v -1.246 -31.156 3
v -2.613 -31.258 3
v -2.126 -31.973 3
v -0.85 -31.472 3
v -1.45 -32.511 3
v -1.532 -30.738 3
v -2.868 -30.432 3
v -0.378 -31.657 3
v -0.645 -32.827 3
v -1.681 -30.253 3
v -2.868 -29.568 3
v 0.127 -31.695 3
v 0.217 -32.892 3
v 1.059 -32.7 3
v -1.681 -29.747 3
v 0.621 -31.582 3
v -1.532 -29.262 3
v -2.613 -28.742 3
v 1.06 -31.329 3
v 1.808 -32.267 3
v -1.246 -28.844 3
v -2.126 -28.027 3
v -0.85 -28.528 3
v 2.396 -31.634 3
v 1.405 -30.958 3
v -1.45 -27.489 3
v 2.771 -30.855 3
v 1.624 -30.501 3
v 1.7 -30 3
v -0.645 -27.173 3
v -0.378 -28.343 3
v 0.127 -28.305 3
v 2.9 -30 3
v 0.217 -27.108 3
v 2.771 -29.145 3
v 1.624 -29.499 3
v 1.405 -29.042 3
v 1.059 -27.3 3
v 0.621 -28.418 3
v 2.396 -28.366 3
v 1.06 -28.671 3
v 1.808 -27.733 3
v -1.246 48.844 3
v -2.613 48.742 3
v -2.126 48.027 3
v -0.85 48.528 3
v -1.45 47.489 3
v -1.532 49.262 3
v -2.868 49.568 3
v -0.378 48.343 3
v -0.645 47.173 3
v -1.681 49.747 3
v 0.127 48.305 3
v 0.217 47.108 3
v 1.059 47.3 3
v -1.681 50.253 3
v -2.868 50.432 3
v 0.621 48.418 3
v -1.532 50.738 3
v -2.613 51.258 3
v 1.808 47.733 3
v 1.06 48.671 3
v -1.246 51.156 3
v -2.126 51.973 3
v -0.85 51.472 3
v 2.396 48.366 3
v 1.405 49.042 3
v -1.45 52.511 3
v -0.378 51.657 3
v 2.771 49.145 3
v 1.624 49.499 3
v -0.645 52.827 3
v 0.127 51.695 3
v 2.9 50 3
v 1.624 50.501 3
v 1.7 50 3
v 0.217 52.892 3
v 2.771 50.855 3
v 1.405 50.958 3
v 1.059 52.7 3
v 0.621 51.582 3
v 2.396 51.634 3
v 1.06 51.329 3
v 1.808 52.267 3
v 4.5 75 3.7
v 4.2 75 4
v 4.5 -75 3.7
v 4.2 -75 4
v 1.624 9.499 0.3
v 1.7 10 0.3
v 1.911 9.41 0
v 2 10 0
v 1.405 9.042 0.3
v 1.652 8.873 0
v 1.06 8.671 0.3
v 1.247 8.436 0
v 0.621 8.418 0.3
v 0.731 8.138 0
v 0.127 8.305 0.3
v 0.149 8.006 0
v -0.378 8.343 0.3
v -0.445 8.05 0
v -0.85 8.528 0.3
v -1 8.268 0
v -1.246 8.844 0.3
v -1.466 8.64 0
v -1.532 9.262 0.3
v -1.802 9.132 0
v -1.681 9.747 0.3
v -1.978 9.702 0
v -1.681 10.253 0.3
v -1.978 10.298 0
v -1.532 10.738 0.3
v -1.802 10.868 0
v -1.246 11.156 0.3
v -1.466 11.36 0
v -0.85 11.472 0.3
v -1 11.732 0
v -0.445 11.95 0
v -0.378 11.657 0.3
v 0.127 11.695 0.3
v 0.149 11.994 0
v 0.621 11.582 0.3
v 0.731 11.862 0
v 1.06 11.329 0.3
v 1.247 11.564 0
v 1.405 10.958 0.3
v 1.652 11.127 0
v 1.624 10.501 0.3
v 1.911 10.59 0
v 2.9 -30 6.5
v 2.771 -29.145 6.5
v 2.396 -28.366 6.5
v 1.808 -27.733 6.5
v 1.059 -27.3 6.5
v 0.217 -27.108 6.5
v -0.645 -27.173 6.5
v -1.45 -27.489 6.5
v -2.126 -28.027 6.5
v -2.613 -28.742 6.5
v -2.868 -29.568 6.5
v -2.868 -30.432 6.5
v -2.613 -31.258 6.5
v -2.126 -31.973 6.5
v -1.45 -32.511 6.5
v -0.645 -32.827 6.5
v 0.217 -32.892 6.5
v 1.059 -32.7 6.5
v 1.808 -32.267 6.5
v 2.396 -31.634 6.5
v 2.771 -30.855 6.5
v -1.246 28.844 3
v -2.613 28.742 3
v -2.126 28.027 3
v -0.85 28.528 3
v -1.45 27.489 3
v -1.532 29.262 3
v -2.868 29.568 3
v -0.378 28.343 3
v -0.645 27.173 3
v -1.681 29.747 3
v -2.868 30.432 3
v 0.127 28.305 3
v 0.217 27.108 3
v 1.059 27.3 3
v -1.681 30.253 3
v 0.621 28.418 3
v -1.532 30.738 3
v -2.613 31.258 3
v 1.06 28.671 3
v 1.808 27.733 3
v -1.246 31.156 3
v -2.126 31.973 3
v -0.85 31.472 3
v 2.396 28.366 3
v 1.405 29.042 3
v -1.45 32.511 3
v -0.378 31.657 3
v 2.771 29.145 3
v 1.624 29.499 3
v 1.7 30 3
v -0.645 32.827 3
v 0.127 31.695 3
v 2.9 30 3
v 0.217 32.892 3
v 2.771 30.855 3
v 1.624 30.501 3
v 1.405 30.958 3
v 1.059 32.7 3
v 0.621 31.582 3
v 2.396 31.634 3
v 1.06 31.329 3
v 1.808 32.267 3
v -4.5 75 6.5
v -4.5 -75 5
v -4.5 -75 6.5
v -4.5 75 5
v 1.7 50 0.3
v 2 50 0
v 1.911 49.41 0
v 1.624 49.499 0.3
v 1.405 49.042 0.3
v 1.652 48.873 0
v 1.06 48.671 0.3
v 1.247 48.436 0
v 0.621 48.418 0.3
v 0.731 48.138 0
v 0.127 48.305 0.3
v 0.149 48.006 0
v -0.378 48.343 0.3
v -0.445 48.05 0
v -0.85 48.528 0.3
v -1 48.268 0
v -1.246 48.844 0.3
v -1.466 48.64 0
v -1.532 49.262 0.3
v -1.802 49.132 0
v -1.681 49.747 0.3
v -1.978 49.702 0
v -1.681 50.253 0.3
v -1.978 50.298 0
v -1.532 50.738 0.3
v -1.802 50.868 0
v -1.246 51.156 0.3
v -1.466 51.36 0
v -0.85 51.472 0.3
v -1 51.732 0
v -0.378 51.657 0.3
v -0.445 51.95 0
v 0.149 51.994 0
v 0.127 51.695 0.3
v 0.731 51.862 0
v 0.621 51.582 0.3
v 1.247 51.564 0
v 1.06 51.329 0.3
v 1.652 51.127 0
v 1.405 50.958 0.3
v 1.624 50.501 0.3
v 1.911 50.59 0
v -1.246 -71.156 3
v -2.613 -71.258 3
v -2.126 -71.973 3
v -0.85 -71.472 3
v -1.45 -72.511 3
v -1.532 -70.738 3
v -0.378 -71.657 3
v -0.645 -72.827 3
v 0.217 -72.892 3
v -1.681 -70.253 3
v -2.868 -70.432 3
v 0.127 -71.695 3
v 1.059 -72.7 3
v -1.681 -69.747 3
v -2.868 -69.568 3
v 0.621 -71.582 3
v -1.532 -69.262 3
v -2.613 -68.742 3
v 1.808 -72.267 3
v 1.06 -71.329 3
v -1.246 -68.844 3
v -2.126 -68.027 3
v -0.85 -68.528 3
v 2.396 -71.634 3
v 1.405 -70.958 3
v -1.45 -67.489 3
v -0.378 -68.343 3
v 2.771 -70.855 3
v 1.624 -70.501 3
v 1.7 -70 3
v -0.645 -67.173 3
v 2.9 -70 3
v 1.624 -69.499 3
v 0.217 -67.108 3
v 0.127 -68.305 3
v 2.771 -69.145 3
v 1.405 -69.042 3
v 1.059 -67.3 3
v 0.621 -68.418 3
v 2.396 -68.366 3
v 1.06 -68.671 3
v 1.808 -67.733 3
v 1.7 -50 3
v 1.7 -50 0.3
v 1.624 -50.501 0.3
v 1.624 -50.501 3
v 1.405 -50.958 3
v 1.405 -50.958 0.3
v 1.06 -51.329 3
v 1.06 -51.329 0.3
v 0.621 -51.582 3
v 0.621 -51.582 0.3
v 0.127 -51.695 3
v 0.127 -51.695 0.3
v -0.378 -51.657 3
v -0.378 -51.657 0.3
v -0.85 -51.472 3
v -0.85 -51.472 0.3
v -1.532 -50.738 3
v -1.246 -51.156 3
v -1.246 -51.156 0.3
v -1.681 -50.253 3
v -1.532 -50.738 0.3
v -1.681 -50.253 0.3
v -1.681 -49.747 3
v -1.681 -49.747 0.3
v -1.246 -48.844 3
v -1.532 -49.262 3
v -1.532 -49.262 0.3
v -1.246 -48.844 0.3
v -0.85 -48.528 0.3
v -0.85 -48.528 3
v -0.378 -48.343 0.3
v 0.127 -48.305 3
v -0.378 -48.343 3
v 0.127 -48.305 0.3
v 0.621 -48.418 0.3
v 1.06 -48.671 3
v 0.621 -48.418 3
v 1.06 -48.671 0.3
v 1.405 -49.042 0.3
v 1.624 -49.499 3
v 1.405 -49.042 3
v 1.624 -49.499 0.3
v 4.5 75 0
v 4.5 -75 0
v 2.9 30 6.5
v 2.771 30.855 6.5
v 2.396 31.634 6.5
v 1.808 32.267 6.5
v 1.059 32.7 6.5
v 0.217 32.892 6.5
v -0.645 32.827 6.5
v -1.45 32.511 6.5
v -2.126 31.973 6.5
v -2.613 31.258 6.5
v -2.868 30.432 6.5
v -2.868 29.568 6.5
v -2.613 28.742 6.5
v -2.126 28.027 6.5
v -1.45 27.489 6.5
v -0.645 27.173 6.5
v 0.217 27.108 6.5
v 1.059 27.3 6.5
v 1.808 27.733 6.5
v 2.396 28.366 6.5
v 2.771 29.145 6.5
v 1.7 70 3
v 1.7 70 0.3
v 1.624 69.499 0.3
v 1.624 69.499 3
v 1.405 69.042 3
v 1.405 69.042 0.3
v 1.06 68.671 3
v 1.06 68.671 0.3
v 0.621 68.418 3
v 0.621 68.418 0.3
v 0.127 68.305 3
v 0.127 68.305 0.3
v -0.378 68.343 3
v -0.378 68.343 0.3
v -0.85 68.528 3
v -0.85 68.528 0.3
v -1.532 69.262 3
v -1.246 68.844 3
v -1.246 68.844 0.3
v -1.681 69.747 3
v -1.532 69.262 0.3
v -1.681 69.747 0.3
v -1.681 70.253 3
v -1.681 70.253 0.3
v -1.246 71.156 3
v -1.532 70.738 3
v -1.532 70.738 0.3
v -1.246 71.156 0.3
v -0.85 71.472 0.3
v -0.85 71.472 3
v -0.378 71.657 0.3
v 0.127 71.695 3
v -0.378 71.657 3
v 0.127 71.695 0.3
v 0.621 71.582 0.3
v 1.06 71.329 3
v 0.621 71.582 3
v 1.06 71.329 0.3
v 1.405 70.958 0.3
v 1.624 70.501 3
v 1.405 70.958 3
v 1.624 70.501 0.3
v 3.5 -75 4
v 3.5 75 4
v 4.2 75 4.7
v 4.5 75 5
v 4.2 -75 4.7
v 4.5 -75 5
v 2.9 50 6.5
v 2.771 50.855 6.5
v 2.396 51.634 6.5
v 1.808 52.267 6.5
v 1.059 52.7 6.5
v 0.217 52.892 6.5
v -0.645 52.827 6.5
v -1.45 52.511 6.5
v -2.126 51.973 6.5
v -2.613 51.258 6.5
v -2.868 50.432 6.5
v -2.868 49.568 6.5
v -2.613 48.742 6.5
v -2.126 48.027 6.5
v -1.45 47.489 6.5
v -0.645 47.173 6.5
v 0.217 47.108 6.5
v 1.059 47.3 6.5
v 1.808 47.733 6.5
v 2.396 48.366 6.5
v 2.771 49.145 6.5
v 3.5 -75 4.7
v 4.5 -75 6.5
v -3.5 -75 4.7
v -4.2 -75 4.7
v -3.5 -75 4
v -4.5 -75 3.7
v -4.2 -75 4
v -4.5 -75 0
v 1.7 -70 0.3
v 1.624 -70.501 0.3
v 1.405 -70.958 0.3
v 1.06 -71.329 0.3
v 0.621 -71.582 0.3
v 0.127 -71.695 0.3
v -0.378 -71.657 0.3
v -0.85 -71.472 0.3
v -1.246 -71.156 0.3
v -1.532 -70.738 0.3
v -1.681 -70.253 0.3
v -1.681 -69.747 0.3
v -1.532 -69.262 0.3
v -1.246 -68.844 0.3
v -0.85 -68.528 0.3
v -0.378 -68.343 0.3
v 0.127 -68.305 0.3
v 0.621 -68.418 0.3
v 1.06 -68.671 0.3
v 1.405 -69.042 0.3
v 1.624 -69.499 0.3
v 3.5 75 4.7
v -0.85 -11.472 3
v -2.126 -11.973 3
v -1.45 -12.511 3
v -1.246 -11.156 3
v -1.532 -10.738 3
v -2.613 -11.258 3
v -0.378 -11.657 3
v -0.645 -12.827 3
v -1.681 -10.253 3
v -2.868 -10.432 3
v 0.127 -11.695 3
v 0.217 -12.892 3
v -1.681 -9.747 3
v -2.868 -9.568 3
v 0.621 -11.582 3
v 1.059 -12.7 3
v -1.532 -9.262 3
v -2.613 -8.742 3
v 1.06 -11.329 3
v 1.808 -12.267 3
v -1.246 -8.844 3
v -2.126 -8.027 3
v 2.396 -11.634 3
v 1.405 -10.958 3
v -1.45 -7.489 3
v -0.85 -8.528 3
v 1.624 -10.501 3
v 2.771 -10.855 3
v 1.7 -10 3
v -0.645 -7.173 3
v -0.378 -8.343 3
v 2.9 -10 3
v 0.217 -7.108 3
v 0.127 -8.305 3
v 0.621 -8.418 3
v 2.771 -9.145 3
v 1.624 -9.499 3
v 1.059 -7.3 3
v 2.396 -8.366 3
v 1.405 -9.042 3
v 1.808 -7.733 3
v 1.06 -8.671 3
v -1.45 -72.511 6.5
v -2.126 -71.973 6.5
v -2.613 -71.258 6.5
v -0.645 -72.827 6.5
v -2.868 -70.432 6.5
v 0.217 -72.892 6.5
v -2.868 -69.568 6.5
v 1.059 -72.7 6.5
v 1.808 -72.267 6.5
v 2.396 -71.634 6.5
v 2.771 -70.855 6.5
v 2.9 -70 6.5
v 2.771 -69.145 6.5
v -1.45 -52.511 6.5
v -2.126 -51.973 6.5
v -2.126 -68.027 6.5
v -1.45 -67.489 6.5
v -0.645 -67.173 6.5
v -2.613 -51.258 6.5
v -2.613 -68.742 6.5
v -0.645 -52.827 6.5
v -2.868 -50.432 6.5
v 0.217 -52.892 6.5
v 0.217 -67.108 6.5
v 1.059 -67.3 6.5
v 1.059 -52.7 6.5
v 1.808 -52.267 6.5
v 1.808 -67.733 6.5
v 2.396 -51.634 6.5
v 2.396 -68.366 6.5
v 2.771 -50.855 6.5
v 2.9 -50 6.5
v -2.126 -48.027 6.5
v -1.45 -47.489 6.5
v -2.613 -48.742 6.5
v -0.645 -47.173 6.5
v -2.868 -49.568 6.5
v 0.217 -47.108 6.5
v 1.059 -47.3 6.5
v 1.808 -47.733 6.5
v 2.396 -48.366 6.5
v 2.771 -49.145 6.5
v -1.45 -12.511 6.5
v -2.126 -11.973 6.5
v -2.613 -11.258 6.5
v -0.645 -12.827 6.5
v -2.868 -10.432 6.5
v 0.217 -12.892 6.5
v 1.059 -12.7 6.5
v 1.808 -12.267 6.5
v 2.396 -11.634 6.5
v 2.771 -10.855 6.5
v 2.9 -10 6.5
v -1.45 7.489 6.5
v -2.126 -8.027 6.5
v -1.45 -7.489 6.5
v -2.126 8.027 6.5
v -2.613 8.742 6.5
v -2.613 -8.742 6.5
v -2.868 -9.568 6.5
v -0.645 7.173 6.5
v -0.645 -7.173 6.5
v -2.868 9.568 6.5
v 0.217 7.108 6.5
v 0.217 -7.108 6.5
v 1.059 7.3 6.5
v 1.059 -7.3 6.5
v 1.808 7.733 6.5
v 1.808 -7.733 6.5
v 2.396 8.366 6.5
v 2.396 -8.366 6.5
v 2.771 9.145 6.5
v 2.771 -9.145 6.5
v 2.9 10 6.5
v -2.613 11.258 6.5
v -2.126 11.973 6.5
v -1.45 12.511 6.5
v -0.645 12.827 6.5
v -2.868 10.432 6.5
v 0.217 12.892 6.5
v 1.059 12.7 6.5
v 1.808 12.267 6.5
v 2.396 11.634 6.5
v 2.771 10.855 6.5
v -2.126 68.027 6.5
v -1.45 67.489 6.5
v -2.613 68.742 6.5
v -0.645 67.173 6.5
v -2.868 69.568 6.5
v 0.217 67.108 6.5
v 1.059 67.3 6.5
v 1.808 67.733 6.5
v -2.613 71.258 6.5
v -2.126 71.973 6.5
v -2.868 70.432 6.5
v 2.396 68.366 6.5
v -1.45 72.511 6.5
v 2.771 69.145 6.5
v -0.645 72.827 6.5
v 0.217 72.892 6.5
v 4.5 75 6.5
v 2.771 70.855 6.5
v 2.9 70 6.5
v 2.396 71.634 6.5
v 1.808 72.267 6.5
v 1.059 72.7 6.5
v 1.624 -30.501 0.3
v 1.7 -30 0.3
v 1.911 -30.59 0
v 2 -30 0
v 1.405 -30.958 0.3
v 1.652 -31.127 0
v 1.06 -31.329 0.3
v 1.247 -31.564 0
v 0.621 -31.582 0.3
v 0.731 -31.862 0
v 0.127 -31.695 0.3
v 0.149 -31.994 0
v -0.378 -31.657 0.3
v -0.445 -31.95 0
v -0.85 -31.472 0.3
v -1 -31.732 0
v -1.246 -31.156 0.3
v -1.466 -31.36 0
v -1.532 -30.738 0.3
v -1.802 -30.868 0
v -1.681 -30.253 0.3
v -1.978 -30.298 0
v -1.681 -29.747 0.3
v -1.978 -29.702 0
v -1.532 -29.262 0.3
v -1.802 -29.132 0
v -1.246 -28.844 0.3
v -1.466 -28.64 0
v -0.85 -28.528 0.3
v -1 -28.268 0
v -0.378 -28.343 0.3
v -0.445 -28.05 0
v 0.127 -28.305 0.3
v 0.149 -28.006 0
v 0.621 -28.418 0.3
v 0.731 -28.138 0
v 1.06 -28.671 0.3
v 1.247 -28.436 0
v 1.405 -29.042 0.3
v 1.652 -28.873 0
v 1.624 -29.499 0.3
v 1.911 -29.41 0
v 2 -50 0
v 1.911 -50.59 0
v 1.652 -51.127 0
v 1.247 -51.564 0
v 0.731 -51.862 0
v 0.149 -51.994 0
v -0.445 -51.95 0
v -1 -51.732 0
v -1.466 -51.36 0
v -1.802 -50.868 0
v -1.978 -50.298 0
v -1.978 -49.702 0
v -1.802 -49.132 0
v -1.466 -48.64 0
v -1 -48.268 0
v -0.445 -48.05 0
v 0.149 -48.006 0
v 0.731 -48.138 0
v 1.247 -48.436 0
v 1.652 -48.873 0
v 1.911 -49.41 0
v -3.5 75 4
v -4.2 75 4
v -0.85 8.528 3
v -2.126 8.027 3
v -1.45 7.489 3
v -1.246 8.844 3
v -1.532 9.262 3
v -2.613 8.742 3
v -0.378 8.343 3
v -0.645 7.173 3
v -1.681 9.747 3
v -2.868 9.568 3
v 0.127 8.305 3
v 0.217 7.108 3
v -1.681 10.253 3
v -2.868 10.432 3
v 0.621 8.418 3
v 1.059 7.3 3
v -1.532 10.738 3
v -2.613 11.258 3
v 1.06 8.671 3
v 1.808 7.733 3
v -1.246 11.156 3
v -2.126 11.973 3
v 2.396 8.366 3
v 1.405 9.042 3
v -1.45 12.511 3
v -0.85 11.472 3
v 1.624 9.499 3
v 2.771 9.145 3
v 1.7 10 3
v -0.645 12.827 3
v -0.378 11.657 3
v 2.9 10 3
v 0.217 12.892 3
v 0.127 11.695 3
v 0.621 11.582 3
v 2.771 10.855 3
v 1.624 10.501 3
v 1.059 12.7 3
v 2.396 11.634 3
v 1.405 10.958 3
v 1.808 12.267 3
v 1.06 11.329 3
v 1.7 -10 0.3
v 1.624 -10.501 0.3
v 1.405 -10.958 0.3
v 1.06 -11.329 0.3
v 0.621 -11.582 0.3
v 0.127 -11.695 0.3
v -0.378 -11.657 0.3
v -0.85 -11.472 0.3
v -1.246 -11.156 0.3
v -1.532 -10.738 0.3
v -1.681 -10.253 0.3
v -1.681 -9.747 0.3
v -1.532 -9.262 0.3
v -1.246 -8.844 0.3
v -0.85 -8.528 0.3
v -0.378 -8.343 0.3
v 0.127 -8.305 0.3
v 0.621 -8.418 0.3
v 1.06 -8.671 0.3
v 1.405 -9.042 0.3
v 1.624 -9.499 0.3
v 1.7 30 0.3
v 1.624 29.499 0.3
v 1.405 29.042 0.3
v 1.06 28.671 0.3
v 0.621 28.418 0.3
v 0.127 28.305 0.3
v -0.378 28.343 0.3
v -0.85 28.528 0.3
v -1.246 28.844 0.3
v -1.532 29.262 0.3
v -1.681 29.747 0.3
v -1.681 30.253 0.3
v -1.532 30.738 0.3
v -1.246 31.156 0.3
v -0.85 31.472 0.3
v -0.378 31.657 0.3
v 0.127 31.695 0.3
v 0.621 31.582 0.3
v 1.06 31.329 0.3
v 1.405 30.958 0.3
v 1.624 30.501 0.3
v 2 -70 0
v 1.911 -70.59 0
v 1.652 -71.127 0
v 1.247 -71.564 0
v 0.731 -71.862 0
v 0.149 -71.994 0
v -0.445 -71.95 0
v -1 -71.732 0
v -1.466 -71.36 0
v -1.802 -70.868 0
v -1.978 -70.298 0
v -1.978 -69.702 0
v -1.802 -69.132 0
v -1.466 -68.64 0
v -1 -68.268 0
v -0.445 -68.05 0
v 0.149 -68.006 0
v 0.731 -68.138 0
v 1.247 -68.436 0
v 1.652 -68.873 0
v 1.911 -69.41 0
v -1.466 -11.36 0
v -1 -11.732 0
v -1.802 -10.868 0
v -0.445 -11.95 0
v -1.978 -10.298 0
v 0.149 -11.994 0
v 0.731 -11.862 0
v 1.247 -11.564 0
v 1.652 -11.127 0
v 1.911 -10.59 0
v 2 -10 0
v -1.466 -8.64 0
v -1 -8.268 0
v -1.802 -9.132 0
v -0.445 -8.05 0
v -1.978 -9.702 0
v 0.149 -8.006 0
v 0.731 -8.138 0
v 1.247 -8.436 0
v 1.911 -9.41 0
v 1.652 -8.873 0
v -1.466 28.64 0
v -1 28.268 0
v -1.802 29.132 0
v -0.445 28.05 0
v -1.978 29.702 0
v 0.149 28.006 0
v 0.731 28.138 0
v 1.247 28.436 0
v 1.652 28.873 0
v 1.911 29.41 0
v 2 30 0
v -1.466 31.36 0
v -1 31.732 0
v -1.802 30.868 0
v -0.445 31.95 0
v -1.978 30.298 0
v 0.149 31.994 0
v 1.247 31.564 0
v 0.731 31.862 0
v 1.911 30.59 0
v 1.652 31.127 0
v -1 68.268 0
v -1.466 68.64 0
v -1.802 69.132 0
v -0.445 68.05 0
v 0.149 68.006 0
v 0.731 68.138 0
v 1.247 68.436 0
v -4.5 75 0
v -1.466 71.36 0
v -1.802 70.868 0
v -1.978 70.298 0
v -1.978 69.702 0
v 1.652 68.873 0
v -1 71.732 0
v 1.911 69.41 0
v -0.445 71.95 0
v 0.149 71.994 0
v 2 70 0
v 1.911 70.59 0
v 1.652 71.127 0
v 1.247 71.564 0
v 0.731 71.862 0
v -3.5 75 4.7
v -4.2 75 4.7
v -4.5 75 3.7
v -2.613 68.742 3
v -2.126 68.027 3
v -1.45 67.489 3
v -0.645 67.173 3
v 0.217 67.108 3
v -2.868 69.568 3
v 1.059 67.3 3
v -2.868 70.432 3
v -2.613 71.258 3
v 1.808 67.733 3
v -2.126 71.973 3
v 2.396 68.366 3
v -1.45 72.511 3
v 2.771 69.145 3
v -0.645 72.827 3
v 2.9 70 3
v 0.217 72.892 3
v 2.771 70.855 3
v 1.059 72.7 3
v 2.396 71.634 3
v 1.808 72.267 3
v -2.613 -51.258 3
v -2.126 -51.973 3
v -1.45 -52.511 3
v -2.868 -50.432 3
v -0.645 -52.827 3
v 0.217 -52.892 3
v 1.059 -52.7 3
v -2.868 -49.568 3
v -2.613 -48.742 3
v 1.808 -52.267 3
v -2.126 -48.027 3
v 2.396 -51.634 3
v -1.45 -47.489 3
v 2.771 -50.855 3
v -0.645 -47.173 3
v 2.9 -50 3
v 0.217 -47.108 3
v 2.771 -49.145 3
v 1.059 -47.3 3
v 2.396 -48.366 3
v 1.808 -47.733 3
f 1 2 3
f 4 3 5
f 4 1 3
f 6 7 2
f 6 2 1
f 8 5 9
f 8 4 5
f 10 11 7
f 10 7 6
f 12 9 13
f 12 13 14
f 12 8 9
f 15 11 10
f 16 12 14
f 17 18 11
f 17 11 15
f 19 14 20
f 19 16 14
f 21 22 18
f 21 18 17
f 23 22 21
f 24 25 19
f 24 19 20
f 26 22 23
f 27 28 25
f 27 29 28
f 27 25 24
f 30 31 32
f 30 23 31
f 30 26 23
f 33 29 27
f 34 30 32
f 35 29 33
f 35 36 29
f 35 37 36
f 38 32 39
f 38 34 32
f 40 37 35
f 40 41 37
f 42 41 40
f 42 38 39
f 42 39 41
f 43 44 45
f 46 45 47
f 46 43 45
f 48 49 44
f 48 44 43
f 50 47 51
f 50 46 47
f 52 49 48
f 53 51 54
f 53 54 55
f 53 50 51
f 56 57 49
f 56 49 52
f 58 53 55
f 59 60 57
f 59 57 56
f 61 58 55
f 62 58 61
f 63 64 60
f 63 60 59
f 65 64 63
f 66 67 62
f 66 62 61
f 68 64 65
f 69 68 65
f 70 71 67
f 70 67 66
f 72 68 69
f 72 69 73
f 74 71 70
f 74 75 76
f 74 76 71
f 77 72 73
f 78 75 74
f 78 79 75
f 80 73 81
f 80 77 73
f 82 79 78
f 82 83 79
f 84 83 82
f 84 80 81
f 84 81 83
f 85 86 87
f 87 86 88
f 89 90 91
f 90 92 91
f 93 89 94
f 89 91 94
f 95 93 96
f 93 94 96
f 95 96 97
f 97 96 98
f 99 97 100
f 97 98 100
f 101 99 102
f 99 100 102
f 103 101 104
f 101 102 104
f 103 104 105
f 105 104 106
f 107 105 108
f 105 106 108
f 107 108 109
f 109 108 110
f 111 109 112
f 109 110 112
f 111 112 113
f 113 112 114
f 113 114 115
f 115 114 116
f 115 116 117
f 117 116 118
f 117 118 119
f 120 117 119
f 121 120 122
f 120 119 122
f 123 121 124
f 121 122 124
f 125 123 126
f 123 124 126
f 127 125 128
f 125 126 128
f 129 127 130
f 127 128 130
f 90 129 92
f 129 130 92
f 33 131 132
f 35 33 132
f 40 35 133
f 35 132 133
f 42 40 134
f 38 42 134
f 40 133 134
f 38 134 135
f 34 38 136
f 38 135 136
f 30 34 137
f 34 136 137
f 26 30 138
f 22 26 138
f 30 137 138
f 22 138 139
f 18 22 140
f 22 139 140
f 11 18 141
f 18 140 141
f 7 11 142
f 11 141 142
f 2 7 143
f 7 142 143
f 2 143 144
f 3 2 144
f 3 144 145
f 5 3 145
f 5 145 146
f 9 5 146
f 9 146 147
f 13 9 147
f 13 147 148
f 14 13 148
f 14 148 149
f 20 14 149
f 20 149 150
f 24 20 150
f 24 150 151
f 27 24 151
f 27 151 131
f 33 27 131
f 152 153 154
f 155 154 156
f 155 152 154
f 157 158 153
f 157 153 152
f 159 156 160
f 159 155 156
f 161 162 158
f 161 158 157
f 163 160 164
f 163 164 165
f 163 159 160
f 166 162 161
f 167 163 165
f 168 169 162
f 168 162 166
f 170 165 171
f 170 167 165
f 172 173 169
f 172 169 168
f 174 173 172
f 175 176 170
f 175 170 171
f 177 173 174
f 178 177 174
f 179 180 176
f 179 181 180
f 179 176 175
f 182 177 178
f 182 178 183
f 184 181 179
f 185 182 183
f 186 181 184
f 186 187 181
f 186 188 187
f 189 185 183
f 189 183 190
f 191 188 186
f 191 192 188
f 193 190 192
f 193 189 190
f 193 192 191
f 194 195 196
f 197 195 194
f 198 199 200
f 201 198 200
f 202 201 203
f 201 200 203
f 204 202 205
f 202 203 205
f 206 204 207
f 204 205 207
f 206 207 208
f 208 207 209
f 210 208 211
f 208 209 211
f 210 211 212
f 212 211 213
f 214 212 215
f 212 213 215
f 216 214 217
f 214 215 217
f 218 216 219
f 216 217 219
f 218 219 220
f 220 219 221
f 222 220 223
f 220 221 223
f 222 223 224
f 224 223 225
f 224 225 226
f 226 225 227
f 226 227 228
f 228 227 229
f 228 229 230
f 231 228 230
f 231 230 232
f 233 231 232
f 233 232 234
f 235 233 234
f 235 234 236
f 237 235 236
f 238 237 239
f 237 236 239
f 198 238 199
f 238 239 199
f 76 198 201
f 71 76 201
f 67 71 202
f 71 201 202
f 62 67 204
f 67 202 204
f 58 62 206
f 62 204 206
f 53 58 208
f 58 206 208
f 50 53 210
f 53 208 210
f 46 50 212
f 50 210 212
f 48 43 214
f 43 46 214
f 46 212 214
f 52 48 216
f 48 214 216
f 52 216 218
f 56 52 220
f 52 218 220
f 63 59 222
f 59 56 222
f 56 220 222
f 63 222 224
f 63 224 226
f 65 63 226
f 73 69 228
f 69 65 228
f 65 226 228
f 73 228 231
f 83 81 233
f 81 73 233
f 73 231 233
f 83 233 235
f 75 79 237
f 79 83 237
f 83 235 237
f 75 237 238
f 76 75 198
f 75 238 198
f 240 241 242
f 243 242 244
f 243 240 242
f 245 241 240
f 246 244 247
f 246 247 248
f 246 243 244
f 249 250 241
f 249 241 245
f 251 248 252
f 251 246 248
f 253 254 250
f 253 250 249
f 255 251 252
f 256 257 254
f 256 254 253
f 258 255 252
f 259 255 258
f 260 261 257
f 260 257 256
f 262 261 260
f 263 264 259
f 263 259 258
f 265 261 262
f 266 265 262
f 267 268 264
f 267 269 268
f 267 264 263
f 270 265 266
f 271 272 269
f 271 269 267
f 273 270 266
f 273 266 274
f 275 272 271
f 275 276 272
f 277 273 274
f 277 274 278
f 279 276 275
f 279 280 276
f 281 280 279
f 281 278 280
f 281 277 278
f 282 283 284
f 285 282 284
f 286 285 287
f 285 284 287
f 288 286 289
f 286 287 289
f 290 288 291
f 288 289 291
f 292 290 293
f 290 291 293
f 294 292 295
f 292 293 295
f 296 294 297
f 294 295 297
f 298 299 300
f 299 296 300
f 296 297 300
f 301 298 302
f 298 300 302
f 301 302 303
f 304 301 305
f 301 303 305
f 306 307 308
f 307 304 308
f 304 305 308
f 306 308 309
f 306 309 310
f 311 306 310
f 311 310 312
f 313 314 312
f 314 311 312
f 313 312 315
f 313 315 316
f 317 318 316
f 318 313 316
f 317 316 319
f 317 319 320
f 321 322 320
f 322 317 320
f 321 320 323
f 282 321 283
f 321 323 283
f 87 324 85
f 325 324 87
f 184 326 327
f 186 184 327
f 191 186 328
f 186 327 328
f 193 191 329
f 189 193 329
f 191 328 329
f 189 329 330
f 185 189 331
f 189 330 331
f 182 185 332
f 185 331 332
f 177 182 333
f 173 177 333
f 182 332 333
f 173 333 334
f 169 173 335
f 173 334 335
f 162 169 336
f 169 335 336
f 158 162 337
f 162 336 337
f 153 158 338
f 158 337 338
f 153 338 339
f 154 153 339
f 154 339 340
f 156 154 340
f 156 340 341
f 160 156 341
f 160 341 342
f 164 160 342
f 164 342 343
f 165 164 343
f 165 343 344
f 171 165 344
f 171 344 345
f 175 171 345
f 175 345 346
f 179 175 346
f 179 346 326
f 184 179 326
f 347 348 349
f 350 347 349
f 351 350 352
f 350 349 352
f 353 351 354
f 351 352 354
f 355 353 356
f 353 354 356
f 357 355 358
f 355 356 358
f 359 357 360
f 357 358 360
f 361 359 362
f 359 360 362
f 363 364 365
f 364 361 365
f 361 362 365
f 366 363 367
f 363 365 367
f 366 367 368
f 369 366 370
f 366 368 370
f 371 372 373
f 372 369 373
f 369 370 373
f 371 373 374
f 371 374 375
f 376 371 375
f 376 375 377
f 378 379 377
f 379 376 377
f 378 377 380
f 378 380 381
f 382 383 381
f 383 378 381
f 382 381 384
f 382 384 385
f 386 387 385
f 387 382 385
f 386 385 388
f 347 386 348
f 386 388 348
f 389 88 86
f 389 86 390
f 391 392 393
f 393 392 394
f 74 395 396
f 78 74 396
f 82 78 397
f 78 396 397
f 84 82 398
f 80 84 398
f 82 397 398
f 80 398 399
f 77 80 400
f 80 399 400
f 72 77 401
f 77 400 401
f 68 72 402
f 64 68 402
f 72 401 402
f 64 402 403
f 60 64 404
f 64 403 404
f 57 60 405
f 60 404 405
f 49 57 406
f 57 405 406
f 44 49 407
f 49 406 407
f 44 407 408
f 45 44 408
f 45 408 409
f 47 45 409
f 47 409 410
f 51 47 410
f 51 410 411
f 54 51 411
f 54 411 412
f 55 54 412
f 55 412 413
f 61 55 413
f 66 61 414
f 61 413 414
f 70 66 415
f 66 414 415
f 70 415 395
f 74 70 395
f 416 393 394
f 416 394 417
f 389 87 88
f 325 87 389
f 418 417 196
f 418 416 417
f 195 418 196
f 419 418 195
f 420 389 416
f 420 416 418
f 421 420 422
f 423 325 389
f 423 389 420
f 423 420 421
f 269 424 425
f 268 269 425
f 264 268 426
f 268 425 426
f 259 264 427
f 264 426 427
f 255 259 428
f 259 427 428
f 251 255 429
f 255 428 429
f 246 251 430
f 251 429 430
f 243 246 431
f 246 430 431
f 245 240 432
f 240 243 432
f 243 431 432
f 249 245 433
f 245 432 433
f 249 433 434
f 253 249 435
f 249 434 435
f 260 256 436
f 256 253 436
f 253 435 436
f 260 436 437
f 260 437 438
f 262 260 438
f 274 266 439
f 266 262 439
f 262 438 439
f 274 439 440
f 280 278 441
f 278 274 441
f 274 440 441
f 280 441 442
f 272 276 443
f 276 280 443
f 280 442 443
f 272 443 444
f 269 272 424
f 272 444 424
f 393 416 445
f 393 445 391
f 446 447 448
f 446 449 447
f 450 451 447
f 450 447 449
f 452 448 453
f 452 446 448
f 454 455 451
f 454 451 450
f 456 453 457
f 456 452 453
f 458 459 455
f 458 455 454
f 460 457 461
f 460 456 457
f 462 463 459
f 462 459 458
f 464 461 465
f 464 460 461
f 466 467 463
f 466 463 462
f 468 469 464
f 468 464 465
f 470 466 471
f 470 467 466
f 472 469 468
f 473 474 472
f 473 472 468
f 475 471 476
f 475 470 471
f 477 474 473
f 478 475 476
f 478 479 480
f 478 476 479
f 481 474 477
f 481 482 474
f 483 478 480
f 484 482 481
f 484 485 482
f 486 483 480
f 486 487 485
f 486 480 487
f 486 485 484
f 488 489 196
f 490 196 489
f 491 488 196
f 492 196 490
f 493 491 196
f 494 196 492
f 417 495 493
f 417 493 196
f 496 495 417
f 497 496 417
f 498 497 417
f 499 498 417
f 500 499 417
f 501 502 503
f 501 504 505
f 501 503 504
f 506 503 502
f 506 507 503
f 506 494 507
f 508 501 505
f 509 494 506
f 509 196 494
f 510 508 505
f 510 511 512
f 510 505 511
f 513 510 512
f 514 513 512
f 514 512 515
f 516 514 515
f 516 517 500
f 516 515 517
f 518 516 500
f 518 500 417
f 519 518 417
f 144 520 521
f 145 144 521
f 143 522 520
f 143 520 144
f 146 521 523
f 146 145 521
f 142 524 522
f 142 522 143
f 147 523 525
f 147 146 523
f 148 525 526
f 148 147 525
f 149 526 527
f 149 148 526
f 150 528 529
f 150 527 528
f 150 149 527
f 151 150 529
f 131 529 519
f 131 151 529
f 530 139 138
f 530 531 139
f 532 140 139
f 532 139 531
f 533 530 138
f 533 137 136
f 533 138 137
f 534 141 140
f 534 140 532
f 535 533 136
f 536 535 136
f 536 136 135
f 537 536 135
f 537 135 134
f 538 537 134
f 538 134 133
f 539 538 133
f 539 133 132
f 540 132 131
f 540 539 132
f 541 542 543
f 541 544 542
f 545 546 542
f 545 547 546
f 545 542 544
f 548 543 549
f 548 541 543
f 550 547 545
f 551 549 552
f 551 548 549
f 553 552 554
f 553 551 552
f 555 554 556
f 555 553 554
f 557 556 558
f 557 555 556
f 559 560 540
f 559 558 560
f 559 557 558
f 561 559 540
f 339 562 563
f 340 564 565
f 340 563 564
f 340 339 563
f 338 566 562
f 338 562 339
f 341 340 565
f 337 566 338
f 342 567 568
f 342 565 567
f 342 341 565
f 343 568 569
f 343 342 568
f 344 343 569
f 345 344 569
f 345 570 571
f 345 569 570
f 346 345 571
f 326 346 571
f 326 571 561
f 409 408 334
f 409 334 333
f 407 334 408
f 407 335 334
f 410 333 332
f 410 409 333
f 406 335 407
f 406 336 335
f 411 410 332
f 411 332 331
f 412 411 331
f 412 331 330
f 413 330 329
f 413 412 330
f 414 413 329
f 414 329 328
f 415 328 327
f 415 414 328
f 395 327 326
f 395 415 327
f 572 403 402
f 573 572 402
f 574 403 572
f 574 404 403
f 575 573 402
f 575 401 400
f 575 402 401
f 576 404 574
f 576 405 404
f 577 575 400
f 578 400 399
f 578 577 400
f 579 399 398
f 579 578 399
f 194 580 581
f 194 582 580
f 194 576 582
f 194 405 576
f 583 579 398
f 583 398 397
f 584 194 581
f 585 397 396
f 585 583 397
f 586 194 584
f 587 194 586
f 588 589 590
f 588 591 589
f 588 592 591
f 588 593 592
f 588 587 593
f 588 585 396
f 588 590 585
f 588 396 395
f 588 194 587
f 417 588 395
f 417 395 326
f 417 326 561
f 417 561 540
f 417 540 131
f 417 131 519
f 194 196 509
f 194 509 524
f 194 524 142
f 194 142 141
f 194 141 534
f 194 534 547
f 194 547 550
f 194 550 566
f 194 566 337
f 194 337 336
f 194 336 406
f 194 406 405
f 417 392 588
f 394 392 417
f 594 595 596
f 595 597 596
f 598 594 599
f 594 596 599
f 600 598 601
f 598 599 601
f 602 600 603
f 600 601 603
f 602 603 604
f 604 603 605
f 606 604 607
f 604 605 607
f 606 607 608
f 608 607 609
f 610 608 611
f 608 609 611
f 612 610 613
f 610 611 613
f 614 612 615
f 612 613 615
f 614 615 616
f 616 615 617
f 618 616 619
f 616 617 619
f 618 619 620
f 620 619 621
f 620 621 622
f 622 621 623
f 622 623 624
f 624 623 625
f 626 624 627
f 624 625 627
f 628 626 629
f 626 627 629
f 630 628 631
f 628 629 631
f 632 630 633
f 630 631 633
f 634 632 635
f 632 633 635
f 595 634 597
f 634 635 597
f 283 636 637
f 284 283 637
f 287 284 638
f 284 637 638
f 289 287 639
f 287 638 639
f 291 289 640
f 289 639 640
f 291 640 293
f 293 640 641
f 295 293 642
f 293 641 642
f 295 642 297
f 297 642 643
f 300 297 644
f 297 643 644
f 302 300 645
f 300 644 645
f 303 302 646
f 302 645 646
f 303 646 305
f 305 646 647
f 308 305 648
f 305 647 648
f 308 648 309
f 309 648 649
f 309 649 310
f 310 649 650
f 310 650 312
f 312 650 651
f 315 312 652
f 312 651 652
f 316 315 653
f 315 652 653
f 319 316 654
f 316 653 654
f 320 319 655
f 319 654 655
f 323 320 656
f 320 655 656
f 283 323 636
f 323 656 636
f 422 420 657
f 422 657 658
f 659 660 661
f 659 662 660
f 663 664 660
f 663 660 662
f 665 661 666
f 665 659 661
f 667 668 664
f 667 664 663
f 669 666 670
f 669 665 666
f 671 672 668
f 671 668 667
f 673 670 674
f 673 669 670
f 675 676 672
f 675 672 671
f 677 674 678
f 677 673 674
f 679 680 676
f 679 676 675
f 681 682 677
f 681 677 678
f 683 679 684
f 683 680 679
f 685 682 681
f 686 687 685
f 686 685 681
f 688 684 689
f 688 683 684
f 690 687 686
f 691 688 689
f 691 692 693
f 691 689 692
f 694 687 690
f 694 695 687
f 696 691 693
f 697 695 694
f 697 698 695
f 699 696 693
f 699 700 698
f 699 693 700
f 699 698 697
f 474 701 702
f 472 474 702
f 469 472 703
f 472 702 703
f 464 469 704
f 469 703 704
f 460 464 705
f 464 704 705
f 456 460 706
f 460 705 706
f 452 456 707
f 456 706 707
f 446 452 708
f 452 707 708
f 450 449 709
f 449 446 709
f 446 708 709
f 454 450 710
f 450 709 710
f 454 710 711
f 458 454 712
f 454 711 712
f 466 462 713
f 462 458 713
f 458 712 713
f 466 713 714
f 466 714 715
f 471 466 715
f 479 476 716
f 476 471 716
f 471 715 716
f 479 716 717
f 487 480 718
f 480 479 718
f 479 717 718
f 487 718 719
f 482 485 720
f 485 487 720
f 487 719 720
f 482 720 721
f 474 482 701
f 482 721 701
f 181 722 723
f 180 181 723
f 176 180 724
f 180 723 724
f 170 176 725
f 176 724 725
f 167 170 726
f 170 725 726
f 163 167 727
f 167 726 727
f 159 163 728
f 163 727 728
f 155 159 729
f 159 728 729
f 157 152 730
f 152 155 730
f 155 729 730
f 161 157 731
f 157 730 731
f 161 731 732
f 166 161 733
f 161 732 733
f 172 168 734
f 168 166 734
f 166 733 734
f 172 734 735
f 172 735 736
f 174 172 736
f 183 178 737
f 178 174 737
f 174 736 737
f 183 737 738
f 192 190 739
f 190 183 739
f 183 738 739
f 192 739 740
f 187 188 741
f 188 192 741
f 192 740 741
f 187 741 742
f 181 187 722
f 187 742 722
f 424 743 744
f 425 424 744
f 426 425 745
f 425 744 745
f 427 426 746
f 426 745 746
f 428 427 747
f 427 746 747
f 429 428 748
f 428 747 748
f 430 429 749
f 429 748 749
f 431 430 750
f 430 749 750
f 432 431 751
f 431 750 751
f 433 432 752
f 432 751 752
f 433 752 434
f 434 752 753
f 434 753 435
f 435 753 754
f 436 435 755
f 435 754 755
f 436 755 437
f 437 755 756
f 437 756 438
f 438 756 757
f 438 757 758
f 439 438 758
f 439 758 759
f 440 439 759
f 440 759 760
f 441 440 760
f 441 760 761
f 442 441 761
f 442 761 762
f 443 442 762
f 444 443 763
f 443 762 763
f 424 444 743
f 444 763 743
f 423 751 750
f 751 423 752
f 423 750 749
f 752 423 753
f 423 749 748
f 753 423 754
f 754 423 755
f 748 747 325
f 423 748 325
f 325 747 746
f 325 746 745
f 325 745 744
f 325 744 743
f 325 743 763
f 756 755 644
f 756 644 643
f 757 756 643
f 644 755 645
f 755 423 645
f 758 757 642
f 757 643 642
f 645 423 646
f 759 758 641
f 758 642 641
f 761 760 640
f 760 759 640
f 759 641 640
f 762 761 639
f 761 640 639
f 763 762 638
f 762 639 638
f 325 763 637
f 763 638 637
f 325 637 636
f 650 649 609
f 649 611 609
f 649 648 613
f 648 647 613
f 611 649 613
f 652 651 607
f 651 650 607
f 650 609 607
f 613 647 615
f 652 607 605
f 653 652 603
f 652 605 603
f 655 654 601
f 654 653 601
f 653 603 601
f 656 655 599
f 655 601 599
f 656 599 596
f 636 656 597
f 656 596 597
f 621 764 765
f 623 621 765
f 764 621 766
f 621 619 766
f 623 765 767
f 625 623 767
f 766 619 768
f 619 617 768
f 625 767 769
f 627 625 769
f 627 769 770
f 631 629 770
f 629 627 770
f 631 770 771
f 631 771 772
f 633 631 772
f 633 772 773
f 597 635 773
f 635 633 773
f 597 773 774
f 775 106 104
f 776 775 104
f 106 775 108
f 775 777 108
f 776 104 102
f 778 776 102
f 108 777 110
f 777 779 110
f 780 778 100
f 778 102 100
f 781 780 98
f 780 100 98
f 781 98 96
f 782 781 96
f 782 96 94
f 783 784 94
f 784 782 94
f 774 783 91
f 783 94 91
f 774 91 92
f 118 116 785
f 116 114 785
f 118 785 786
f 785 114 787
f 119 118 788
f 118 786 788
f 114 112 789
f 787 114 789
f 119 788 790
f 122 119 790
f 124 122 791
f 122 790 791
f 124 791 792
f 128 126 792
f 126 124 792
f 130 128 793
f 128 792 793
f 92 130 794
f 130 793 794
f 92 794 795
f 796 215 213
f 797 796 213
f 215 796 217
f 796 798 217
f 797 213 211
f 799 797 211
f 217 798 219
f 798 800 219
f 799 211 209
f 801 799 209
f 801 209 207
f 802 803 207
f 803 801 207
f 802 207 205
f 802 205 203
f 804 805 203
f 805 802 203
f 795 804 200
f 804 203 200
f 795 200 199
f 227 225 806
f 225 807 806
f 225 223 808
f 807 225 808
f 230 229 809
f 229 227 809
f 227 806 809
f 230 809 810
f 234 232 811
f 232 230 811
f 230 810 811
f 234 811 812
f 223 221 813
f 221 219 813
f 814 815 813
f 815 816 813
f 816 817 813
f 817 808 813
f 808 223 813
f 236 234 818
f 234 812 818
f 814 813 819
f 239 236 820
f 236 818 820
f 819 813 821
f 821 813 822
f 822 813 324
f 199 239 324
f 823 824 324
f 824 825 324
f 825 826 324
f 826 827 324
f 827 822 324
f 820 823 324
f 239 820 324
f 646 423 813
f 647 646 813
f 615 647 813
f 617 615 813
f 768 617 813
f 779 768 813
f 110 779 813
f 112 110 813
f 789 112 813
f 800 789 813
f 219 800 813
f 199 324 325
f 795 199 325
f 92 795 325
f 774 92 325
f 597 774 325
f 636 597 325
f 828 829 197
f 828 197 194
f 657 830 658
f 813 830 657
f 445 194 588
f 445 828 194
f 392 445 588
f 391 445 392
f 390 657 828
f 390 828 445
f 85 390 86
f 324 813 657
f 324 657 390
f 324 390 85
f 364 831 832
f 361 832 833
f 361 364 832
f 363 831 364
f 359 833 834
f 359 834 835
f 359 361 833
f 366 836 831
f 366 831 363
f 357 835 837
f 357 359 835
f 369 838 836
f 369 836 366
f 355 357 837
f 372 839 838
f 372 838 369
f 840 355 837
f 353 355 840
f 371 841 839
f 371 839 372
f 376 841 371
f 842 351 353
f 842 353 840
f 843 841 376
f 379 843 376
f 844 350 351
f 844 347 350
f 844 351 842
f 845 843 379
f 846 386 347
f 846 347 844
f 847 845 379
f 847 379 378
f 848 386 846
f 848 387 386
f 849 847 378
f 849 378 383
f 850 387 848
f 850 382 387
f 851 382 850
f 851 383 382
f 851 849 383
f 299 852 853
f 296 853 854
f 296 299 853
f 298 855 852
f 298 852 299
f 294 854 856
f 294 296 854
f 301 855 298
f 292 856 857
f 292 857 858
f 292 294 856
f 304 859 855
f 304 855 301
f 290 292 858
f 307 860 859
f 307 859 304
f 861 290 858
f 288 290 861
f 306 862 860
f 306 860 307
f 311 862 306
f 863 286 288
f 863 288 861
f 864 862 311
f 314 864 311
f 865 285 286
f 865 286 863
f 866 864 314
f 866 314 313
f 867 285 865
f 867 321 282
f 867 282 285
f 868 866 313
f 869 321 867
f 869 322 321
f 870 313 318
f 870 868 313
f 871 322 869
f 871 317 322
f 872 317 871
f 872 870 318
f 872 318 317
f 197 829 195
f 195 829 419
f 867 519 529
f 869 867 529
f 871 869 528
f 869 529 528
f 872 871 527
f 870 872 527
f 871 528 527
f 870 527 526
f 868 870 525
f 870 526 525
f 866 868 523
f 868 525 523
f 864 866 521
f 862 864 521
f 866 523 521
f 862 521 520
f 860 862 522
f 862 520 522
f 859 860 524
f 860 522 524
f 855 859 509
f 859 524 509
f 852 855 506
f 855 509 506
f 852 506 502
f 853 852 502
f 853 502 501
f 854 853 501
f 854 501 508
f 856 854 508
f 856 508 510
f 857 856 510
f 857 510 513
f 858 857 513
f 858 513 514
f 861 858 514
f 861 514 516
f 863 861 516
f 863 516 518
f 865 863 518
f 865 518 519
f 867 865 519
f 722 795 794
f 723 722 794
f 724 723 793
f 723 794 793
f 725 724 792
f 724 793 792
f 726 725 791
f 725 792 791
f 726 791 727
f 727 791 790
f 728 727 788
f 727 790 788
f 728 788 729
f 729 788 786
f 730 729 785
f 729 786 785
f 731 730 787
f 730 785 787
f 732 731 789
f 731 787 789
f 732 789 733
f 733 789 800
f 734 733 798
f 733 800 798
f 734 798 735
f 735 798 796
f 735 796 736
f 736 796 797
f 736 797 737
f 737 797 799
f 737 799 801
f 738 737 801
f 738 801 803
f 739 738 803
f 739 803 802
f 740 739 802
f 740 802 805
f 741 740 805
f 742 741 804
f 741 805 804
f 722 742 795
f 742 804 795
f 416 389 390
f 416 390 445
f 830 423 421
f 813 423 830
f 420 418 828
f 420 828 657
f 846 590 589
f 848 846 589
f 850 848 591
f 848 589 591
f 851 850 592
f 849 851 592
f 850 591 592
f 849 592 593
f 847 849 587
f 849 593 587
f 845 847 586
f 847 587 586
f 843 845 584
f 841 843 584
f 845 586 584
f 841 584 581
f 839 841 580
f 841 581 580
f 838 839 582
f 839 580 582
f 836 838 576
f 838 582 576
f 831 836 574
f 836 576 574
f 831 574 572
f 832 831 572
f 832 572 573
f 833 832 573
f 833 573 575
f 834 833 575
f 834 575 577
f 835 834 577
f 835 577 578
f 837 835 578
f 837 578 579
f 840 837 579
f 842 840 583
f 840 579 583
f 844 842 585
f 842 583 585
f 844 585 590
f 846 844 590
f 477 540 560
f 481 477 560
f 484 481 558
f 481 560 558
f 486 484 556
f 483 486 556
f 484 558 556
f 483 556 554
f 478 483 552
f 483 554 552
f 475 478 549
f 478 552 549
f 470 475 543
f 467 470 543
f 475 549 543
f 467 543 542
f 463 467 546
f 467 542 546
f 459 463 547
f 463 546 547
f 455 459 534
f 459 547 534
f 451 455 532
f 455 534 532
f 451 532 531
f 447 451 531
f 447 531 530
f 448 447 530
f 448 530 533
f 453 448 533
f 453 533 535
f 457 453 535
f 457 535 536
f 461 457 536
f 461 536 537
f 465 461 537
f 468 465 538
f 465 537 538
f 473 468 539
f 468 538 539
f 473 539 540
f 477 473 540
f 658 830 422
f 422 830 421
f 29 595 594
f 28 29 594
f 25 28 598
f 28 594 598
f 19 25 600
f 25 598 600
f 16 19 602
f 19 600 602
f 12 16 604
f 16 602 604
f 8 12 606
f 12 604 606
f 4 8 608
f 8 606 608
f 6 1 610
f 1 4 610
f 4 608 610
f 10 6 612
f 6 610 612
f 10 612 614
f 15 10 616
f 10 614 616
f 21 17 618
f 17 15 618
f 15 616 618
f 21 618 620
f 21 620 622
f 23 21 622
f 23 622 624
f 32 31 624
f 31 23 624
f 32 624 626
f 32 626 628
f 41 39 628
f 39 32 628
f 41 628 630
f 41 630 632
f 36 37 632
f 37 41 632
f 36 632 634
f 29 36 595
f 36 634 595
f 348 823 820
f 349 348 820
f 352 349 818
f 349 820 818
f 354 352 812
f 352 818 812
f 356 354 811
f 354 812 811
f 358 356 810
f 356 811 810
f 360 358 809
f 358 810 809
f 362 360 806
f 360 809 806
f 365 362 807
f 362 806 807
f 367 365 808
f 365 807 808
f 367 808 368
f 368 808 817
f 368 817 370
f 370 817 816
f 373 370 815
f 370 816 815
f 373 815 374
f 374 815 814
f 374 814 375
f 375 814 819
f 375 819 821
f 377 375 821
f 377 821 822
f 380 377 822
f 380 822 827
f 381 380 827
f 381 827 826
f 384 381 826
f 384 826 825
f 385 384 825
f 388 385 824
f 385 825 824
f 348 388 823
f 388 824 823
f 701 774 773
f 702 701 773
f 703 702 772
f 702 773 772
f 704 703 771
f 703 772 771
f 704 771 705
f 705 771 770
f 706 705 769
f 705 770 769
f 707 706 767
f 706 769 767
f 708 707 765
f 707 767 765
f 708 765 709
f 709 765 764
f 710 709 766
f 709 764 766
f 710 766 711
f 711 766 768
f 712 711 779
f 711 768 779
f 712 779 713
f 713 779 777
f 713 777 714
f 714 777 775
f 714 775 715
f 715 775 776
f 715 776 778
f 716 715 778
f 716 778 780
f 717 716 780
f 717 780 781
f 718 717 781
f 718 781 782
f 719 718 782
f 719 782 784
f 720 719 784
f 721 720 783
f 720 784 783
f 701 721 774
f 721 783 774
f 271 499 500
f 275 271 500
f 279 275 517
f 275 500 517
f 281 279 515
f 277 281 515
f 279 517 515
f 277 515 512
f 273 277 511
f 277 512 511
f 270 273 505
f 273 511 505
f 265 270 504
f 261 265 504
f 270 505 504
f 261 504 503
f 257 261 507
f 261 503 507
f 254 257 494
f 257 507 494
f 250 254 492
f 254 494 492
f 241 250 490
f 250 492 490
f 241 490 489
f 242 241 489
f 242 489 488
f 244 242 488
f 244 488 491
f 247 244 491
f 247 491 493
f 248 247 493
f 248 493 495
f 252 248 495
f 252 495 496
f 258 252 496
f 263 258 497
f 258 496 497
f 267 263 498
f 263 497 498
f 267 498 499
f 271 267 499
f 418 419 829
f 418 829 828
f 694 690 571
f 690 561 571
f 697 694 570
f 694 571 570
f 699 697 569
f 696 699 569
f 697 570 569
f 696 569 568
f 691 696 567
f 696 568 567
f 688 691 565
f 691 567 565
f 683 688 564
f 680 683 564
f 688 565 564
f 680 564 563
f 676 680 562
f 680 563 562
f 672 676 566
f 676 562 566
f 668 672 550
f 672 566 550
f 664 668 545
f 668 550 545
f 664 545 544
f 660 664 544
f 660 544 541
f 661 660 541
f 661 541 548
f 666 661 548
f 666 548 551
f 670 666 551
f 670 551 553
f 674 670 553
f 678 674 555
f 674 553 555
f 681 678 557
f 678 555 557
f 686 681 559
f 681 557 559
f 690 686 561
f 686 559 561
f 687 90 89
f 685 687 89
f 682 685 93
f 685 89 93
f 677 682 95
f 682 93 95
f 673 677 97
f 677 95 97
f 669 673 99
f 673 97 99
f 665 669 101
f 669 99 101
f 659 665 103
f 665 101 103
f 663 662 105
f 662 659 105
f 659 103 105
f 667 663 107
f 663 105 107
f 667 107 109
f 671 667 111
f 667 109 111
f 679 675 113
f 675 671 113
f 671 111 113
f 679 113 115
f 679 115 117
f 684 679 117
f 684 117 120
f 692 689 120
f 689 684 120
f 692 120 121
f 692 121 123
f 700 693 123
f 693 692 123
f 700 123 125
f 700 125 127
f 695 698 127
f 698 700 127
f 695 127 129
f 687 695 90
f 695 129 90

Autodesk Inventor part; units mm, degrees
ref_plane "YZ Plane" through (0, 0, 0) normal (1, 0, 0) x (0, 1, 0)
ref_plane "XZ Plane" through (0, 0, 0) normal (0, 1, 0) x (-1, 0, 0)
ref_plane "XY Plane" through (0, 0, 0) normal (0, 0, 1) x (1, 0, 0)
sketch "スケッチ1" plane through (0, 0, 0) normal (0, 0, 1) x (1, 0, 0)
  line L0 (-4.5, 75) -> (4.5, 75)
  line L1 (4.5, 75) -> (4.5, -75)
  line L2 (4.5, -75) -> (-4.5, -75)
  line L3 (-4.5, -75) -> (-4.5, 75)
  line L4 (-4.5, 75) -> (4.5, -75) construction
  line L5 (4.5, 75) -> (-4.5, -75) construction
  circle A0 centre (0, 70) radius 1.7
  circle A1 centre (0, 50) radius 1.7
  circle A2 centre (0, 30) radius 1.7
  circle A3 centre (0, 10) radius 1.7
  circle A4 centre (0, -10) radius 1.7
  circle A5 centre (0, -30) radius 1.7
  circle A6 centre (0, -50) radius 1.7
  circle A7 centre (0, -70) radius 1.7
  point P0 (0, 0)
  dimension "d0" = 9
  dimension "d1" = 150
  dimension "d2" = 3.4
  dimension "d3" = 3.4
  dimension "d4" = 3.4
  dimension "d5" = 3.4
  dimension "d6" = 3.4
  dimension "d7" = 3.4
  dimension "d8" = 3.4
  dimension "d9" = 3.4
extrude "押し出し1" add sketch "スケッチ1" along normal blind 6.5
sketch "スケッチ2" plane through (0, 0, 6.5) normal (0, 0, 1) x (1, 0, 0)
  circle A0 centre (0, -70) radius 1.7 projected
  circle A1 centre (0, -70) radius 2.9
  circle A2 centre (0, -50) radius 1.7 projected
  circle A3 centre (0, -50) radius 2.9
  circle A4 centre (0, -30) radius 1.7 projected
  circle A5 centre (0, -30) radius 2.9
  circle A6 centre (0, -10) radius 1.7 projected
  circle A7 centre (0, -10) radius 2.9
  circle A8 centre (0, 10) radius 1.7 projected
  circle A9 centre (0, 10) radius 2.9
  circle A10 centre (0, 30) radius 1.7 projected
  circle A11 centre (0, 30) radius 2.9
  circle A12 centre (0, 50) radius 1.7 projected
  circle A13 centre (0, 50) radius 2.9
  circle A14 centre (0, 70) radius 1.7 projected
  circle A15 centre (0, 70) radius 2.9
  point P0 (0, 0)
  dimension "d12" = 5.8
  dimension "d13" = 5.8
  dimension "d14" = 5.8
  dimension "d15" = 5.8
  dimension "d16" = 5.8
  dimension "d17" = 5.8
  dimension "d18" = 5.8
  dimension "d19" = 5.8
extrude "押し出し2" cut sketch "スケッチ2" against normal blind 3.5
sketch "スケッチ3" plane through (-4.5, 75, 0) normal (0, 1, 0) x (1, 0, 0)
  line L0 (9, 0) -> (9, -6.5) projected
  line L1 (9, -4) -> (8, -4)
  line L2 (9, -4) -> (10, -4) construction
  line L3 (8, -4) -> (8, -4.7)
  line L4 (8, -4.7) -> (9, -4.7)
  line L5 (9, -4.7) -> (9, -4)
  line L6 (0, 0) -> (0, -6.5) projected
  line L7 (0, -4.7) -> (1, -4.7)
  line L8 (1, -4.7) -> (1, -4)
  line L9 (1, -4) -> (0, -4)
  line L10 (0, -4.7) -> (0, -4)
  point P0 (4.5, 0)
  dimension "d22" = 1
  dimension "d23" = 180
  dimension "d24" = 0.7
  dimension "d25" = 1
extrude "押し出し3" cut sketch "スケッチ3" against normal blind 150
chamfer "面取り1" distance 0.3 angle 45 4 edges at (4.5, 0, 4) (4.5, 0, 4.7) (-4.5, 0, 4) (-4.5, 0, 4.7)
chamfer "面取り2" distance 0.3 angle 45 8 edges at (-1.7, 70, 0) (-1.7, 50, 0) (-1.7, 30, 0) (-1.7, 10, 0) (-1.7, -10, 0) (-1.7, -30, 0) (-1.7, -50, 0) (-1.7, -70, 0)
properties part number "rail" material "鉄、可鍛鉄"
